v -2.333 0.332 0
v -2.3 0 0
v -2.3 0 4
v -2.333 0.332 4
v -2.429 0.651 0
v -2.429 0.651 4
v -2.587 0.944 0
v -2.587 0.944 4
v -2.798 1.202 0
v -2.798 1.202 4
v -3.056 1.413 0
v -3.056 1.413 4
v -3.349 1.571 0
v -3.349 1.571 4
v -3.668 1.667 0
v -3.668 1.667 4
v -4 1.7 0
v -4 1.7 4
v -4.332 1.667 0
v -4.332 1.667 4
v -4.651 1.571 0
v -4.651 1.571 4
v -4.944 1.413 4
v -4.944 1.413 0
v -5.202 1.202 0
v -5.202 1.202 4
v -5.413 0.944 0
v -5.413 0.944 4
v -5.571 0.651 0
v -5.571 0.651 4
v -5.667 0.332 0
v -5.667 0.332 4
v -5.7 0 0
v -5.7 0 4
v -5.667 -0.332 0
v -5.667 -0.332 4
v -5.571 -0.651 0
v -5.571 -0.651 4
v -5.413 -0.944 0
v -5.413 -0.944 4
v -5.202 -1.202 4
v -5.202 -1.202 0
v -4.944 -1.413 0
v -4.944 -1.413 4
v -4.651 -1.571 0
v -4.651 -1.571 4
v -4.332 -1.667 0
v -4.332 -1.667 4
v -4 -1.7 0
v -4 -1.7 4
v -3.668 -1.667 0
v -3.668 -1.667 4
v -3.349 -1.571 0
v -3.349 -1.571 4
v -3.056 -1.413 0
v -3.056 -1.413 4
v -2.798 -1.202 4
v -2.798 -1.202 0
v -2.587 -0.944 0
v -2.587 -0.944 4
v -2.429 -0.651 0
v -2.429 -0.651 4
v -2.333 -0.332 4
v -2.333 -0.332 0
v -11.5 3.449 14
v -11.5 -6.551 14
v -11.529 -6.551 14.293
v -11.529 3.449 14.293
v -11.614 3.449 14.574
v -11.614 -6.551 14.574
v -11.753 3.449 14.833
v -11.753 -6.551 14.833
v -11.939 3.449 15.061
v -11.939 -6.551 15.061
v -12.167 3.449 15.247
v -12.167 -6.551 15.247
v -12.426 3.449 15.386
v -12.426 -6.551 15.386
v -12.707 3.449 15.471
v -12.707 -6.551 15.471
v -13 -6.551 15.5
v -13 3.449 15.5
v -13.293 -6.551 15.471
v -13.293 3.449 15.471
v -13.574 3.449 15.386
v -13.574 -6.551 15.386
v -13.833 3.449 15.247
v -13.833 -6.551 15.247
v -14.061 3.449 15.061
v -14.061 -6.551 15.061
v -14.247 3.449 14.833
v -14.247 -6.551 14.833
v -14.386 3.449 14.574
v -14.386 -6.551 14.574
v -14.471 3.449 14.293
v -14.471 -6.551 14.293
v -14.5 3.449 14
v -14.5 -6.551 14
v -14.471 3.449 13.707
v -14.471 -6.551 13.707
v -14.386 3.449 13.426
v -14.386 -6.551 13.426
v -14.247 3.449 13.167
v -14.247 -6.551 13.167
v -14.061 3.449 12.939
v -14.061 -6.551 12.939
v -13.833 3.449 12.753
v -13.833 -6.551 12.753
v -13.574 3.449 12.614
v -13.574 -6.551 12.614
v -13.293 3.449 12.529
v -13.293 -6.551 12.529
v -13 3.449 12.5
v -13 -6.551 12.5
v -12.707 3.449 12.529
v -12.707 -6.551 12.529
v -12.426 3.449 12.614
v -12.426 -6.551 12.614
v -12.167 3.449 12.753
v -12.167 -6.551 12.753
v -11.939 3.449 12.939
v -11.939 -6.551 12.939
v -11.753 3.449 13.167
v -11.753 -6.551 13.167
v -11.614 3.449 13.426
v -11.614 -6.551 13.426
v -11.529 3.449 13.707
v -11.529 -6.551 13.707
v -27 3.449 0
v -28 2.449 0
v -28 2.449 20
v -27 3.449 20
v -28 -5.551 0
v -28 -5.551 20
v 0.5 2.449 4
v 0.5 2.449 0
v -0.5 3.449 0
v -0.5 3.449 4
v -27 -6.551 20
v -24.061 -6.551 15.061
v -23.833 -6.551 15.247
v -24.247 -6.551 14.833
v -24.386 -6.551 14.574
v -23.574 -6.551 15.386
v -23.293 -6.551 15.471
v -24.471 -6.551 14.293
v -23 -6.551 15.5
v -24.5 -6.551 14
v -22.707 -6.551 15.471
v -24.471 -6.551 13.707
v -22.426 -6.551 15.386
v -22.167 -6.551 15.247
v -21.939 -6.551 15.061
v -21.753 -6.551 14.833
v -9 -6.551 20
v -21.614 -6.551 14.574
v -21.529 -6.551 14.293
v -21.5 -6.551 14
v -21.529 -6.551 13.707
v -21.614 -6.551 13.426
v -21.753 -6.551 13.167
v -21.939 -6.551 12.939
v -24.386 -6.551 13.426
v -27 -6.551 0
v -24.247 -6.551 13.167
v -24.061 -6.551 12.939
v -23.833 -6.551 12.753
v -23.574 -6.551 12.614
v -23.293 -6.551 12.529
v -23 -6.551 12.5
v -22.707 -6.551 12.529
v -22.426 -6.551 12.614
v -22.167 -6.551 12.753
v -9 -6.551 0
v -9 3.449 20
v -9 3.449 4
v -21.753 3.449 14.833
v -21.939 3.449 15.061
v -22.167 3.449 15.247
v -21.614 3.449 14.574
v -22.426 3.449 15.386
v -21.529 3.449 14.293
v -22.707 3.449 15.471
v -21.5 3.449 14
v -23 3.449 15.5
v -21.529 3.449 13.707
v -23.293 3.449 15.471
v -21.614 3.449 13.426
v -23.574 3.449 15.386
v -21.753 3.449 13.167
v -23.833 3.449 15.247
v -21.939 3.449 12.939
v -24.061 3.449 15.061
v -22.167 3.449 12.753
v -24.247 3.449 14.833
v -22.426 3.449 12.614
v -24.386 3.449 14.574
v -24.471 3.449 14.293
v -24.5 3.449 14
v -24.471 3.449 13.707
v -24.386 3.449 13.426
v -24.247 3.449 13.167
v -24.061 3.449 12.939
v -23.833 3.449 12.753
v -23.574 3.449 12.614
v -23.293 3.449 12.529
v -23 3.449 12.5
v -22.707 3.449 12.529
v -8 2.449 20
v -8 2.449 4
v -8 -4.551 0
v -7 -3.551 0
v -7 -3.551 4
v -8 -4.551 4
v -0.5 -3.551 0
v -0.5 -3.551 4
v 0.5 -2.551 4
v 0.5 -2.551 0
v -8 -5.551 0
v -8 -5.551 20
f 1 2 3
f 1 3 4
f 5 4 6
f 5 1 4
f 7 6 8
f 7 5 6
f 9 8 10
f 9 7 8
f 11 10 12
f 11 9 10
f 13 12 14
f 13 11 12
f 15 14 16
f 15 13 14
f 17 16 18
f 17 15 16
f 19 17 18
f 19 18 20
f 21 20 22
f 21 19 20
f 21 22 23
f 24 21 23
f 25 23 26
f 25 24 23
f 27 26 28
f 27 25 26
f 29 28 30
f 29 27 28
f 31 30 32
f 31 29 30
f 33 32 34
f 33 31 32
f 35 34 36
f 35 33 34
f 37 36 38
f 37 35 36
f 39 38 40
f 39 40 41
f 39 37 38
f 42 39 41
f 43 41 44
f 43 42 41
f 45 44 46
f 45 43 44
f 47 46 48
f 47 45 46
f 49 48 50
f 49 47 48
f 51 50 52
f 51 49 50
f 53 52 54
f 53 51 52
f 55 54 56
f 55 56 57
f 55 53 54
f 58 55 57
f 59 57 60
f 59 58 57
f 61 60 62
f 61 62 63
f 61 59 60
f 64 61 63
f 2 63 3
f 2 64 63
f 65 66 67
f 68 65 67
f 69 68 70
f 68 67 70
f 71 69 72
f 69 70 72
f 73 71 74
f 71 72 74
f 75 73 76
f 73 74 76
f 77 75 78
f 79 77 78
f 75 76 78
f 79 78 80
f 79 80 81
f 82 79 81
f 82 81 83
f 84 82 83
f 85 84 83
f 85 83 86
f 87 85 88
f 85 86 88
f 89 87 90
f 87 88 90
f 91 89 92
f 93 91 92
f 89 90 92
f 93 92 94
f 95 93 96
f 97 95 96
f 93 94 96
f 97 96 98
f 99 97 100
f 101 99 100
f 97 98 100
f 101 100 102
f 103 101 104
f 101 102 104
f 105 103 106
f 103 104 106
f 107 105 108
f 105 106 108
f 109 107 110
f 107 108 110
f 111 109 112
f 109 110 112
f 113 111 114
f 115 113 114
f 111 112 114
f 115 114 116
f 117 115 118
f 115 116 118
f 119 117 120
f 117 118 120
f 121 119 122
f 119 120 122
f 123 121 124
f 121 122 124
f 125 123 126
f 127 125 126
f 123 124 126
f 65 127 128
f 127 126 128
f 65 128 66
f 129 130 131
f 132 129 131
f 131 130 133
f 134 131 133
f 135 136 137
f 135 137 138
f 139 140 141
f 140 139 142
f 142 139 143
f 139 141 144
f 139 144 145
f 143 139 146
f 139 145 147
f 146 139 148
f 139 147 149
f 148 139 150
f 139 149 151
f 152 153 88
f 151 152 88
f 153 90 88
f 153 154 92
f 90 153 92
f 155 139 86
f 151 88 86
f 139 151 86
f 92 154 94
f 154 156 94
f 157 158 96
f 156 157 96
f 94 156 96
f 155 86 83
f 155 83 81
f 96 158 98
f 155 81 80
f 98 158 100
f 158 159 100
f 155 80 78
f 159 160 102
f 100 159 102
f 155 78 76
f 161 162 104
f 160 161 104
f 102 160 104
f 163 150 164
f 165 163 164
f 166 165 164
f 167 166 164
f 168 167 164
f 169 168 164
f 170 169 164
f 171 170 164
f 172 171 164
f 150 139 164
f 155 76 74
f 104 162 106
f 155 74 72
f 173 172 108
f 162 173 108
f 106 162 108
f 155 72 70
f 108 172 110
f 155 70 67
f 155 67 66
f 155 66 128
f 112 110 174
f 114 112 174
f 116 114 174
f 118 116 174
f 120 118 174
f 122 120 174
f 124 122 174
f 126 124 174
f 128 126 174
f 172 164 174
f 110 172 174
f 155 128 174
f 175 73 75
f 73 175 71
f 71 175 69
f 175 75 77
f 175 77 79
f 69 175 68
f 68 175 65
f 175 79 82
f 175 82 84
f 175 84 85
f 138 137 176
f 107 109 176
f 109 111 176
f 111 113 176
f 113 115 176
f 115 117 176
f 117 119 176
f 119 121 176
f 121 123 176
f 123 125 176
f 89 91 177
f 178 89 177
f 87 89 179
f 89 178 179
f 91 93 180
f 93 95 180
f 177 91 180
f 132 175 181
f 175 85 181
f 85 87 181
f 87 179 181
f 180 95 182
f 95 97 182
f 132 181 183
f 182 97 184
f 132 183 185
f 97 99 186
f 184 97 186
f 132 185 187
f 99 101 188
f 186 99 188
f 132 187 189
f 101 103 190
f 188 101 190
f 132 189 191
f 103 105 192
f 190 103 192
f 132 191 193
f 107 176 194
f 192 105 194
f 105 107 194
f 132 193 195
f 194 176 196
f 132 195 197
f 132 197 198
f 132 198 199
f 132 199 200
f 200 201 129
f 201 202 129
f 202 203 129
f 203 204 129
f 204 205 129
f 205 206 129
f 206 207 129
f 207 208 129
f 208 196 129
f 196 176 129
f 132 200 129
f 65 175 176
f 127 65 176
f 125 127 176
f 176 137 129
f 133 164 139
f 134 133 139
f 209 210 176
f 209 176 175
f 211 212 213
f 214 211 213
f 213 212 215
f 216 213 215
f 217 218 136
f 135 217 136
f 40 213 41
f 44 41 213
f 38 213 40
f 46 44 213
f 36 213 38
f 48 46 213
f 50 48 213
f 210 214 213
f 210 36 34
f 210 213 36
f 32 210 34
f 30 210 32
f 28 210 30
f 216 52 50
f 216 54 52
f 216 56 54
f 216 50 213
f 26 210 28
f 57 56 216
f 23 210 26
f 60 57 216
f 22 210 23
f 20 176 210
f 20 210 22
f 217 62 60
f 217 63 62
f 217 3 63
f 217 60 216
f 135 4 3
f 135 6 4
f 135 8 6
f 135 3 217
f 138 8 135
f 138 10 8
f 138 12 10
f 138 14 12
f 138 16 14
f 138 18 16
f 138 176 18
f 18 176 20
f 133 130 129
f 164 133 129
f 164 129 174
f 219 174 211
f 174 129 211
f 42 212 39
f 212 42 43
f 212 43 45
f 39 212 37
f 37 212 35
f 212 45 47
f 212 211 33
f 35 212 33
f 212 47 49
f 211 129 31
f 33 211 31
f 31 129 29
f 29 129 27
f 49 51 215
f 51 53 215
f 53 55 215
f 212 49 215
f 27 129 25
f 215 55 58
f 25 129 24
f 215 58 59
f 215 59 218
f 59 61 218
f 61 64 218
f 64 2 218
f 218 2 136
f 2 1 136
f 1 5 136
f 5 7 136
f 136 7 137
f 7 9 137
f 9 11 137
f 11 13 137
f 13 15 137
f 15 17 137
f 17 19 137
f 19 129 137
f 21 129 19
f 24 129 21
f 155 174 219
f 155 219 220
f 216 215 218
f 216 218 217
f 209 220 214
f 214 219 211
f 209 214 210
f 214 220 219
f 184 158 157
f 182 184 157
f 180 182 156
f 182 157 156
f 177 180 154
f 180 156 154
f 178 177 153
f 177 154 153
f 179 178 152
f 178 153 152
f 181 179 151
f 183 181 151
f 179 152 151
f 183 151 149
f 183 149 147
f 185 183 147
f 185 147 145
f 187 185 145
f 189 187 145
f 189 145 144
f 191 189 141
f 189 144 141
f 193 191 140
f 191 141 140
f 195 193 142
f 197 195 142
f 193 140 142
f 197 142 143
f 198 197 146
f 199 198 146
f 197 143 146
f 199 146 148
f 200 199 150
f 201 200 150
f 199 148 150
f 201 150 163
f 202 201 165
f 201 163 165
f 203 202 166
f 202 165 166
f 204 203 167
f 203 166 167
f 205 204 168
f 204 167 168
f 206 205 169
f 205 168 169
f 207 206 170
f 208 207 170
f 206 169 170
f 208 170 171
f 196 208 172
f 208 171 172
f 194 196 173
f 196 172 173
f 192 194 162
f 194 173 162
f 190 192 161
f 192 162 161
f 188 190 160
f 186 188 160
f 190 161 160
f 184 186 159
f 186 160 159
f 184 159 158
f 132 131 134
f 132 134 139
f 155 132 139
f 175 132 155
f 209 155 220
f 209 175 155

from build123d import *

# Parameters (mm, degrees)
F0_R     = 1.7
F1_DEPTH = 4
F2_DEPTH = 20
F3_R     = 1.5
F4_DEPTH = 10
F5_SIZE  = 1


with BuildPart() as f1:
    # F0 (on Top) → F1 (new body)
    with BuildSketch(Plane.XY):
        Polygon((-4, 3.448833), (-8, 3.448833), (-8, -3.551167), (0.5, -3.551167), (0.5, 3.448833), align=None)
        with Locations((-4, 0)):
            Circle(F0_R, mode=Mode.SUBTRACT)
    extrude(amount=F1_DEPTH)

    # F0 (on Top) → F2 (join)
    with BuildSketch(Plane.XY):
        Polygon((-8, -3.551167), (-8, 3.448833), (-28, 3.448833), (-28, -3.551167), (-28, -6.551167), (-8, -6.551167), align=None)
    extrude(amount=F2_DEPTH)

    # F3 (on face) → F4 (cut, through all)
    with BuildSketch(Plane.XZ.offset(6.551167)):
        with Locations((-13, 14)):
            Circle(F3_R)
        with Locations((-23, 14)):
            Circle(F3_R)
    extrude(amount=-F4_DEPTH, mode=Mode.SUBTRACT)

    # F5
    f5_edges = [f1.edges().sort_by_distance(p)[0] for p in [
        (-8, -6.551167, 10),
        (-28, -6.551167, 10),
        (-8, 3.448833, 12),
        (-28, 3.448833, 10),
        (0.5, -3.551167, 2),
        (-8, -3.551167, 2),
        (0.5, 3.448833, 2),
    ]]
    chamfer(f5_edges, length=F5_SIZE)


solid = f1.part
